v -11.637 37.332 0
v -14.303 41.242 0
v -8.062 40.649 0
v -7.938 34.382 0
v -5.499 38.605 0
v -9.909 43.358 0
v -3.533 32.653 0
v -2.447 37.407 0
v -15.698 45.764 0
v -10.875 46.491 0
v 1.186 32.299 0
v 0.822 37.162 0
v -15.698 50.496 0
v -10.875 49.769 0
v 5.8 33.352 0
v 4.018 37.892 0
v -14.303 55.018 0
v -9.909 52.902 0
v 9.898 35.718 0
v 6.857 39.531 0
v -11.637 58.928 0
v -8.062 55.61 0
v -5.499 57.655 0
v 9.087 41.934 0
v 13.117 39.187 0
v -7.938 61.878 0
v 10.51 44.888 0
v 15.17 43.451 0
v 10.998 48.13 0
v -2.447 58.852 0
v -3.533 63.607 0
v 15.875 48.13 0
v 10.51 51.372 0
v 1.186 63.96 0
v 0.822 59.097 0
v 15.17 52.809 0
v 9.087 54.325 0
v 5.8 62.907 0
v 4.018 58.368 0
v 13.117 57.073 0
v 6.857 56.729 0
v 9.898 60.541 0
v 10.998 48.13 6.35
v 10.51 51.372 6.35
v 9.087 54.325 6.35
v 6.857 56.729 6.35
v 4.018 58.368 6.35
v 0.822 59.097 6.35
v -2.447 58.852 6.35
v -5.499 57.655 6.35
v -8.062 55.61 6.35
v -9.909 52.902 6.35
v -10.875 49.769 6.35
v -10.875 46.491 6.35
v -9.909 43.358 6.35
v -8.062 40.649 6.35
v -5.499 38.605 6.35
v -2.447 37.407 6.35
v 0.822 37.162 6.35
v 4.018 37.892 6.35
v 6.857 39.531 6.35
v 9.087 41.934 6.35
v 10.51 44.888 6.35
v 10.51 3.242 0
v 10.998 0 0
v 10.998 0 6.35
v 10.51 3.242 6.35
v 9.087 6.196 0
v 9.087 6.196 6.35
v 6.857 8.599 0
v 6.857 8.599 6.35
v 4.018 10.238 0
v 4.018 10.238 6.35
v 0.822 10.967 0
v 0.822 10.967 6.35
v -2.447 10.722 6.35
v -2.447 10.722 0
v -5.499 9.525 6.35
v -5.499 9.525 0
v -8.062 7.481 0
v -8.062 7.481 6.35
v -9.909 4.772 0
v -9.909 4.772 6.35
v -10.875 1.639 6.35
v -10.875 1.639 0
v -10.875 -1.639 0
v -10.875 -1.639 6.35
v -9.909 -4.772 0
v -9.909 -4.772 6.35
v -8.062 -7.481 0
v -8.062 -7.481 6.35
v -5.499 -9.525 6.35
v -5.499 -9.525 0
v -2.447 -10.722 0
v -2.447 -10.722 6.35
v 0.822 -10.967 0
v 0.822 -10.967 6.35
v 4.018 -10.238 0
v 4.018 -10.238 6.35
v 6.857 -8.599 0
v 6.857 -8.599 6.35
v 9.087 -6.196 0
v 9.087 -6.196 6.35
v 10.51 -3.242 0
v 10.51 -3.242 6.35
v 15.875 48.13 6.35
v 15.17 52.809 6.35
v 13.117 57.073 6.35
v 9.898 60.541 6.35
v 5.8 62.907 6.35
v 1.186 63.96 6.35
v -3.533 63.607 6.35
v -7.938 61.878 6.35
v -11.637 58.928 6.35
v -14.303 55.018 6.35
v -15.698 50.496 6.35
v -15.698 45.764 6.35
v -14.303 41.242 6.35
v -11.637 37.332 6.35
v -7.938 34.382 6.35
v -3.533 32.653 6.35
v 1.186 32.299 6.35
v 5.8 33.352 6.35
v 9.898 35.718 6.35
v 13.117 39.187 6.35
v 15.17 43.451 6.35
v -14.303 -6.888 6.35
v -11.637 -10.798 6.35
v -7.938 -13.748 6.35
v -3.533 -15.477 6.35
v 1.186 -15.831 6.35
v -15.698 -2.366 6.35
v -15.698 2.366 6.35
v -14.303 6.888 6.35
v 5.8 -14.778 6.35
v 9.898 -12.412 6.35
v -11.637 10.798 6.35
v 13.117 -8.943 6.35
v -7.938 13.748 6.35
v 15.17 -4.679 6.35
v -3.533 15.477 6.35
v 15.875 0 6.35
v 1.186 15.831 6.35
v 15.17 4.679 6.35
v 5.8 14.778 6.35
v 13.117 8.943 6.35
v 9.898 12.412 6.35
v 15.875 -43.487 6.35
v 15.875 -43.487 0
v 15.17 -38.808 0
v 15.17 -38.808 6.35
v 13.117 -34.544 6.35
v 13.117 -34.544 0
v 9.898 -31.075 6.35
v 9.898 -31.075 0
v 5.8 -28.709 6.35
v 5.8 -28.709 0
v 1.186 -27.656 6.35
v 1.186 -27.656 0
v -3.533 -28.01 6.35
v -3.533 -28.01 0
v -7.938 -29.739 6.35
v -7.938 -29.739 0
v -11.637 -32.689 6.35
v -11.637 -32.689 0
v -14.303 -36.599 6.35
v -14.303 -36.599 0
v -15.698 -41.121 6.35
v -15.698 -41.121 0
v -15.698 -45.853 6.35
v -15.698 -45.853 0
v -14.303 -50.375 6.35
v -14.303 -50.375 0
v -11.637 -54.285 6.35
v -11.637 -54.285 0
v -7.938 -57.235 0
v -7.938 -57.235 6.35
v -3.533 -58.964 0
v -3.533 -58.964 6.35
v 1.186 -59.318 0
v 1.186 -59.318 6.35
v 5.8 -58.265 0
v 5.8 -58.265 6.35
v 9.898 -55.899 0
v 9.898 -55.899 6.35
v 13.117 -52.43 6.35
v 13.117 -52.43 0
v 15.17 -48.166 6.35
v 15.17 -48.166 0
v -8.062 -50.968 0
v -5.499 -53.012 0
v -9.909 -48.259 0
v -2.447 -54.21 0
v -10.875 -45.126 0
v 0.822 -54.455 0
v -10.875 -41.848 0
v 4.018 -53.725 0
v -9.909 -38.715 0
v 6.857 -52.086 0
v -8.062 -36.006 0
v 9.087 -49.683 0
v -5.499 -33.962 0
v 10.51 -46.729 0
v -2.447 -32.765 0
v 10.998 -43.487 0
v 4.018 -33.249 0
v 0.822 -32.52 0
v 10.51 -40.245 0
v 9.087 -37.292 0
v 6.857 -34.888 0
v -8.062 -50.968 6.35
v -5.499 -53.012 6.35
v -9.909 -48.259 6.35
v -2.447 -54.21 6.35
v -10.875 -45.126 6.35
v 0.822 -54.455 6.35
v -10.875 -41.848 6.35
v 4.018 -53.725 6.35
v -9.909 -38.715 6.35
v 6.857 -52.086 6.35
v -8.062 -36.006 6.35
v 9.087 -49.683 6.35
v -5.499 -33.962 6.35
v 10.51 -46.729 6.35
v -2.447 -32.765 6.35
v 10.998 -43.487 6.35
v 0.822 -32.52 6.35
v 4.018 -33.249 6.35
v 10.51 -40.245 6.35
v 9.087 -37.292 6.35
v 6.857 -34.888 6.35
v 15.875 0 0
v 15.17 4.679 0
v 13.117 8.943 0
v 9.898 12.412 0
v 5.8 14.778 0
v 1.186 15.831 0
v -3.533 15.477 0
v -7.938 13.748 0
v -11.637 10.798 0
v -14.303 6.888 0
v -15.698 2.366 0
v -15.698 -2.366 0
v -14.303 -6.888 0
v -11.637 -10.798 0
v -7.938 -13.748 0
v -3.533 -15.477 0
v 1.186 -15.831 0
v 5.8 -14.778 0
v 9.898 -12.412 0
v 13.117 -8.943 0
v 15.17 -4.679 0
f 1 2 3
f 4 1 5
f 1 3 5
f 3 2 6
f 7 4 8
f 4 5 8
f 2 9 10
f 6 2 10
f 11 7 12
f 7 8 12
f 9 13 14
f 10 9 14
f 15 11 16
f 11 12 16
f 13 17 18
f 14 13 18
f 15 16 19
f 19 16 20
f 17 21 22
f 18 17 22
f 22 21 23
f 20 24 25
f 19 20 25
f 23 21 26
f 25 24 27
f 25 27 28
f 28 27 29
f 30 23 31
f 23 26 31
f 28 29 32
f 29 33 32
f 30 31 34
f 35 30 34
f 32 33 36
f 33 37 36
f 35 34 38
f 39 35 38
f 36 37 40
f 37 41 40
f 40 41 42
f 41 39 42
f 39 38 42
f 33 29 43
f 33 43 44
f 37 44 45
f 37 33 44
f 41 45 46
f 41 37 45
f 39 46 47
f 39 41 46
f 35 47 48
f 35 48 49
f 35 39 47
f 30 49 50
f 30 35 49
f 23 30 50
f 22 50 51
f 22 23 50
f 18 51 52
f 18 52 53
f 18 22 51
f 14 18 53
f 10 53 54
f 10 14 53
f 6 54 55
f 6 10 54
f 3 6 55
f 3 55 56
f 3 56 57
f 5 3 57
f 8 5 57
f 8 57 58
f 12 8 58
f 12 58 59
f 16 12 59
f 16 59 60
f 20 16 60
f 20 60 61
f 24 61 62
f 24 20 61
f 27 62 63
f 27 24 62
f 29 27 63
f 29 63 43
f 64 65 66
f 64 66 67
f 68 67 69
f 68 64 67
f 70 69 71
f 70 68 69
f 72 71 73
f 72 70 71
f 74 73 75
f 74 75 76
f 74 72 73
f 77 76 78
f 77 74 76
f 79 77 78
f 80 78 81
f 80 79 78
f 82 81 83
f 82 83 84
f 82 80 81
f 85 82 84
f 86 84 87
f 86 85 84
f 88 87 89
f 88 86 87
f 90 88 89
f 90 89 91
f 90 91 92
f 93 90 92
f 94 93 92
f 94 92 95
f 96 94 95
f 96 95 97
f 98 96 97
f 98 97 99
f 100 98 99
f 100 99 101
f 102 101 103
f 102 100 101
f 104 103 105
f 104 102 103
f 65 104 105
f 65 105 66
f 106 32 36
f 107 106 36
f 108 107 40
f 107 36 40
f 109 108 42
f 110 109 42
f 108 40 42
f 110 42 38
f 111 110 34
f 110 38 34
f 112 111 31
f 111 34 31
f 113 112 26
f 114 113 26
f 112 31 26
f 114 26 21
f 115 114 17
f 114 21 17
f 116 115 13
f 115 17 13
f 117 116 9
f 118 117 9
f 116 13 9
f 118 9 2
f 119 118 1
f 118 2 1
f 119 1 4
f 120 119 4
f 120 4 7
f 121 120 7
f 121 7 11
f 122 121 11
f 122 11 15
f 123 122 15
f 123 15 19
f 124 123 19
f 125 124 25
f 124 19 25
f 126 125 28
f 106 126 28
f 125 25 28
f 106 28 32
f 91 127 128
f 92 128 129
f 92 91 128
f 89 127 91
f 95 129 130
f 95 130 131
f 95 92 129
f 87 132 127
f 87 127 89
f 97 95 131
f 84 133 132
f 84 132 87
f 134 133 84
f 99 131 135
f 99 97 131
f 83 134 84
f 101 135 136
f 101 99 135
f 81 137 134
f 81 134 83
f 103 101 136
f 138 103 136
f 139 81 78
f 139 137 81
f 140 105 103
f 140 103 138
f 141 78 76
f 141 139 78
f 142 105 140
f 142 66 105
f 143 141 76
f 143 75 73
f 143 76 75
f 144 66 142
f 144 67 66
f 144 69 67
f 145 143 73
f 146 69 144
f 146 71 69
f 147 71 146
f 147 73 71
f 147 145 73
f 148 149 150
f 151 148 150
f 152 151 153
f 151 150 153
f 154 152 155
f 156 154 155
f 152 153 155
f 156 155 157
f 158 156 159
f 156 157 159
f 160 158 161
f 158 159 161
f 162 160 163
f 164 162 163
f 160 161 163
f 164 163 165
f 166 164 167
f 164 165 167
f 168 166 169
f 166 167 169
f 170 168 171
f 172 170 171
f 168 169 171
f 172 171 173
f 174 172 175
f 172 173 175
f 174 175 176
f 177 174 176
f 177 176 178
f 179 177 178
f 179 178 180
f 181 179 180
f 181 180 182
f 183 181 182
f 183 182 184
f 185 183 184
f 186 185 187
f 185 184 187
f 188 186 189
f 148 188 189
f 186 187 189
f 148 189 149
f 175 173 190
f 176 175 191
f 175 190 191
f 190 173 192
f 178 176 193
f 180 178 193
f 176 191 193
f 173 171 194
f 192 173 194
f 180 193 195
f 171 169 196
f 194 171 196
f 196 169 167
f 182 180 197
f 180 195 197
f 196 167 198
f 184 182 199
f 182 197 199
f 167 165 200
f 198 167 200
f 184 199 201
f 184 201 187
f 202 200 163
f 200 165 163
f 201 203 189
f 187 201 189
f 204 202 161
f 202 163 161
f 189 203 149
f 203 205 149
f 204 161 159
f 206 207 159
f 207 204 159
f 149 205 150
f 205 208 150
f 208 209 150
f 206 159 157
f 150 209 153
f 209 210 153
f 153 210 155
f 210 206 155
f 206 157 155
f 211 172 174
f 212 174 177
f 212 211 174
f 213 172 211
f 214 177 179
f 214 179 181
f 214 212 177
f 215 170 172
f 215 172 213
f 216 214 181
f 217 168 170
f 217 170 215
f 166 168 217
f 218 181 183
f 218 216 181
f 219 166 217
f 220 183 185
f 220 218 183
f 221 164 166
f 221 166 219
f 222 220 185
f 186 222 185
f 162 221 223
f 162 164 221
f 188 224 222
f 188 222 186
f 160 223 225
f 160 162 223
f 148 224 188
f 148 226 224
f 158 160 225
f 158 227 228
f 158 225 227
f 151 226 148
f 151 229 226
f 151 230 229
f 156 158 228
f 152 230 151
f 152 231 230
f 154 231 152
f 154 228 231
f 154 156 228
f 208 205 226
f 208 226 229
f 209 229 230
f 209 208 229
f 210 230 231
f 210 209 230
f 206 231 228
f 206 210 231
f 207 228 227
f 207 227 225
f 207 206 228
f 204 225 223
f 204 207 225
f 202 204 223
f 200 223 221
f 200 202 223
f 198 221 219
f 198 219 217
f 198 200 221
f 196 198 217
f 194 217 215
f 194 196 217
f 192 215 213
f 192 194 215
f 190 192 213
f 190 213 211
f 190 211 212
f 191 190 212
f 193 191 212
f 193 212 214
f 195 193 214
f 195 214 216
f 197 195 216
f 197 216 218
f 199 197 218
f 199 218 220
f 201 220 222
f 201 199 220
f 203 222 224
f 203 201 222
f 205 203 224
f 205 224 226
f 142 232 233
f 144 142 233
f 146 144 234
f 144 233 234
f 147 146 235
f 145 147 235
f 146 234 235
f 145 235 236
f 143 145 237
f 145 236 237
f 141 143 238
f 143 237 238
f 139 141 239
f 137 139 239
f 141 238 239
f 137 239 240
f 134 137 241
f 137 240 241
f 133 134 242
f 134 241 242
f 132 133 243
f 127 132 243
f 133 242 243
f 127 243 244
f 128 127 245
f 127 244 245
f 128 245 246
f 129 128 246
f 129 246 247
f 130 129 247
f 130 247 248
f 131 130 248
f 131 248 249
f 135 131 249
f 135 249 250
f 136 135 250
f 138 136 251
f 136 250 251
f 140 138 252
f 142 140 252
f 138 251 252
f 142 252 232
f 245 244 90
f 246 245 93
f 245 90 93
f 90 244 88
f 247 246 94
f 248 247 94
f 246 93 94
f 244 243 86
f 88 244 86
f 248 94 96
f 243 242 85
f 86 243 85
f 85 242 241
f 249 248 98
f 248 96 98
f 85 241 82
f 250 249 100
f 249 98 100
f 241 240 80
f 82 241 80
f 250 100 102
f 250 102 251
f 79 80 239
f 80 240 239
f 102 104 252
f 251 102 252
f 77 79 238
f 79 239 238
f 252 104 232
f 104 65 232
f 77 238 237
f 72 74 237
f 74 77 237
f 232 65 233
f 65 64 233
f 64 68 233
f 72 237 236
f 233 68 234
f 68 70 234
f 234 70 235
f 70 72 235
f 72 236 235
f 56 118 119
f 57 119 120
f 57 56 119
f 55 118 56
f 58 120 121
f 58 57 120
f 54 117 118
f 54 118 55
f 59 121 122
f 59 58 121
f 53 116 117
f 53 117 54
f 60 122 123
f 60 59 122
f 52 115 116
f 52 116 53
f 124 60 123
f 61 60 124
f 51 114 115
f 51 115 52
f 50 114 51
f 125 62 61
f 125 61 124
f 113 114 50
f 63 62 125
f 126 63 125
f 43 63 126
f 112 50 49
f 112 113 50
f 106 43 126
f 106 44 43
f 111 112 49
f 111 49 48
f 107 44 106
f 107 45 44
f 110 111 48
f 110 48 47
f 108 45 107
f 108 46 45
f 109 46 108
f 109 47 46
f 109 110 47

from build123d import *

# Parameters (mm, degrees)
F1_R     = 15.875
F1_R_2   = 10.9982
F0_R     = 15.875
F0_R_2   = 10.9982
F2_DEPTH = 6.35


with BuildPart() as f2:
    # F1 (on Top) + F0 (on Top) → F2 (new body)
    with BuildSketch(Plane.XY):
        with Locations((0, 48.129804)):
            Circle(F1_R)
        with Locations((0, 48.129804)):
            Circle(F1_R_2, mode=Mode.SUBTRACT)
        with Locations((0, -43.487061)):
            Circle(F1_R)
        with Locations((0, -43.487061)):
            Circle(F1_R_2, mode=Mode.SUBTRACT)
    with BuildSketch(Plane.XY):
        Circle(F0_R)
        Circle(F0_R_2, mode=Mode.SUBTRACT)
    extrude(amount=F2_DEPTH)


solid = f2.part
